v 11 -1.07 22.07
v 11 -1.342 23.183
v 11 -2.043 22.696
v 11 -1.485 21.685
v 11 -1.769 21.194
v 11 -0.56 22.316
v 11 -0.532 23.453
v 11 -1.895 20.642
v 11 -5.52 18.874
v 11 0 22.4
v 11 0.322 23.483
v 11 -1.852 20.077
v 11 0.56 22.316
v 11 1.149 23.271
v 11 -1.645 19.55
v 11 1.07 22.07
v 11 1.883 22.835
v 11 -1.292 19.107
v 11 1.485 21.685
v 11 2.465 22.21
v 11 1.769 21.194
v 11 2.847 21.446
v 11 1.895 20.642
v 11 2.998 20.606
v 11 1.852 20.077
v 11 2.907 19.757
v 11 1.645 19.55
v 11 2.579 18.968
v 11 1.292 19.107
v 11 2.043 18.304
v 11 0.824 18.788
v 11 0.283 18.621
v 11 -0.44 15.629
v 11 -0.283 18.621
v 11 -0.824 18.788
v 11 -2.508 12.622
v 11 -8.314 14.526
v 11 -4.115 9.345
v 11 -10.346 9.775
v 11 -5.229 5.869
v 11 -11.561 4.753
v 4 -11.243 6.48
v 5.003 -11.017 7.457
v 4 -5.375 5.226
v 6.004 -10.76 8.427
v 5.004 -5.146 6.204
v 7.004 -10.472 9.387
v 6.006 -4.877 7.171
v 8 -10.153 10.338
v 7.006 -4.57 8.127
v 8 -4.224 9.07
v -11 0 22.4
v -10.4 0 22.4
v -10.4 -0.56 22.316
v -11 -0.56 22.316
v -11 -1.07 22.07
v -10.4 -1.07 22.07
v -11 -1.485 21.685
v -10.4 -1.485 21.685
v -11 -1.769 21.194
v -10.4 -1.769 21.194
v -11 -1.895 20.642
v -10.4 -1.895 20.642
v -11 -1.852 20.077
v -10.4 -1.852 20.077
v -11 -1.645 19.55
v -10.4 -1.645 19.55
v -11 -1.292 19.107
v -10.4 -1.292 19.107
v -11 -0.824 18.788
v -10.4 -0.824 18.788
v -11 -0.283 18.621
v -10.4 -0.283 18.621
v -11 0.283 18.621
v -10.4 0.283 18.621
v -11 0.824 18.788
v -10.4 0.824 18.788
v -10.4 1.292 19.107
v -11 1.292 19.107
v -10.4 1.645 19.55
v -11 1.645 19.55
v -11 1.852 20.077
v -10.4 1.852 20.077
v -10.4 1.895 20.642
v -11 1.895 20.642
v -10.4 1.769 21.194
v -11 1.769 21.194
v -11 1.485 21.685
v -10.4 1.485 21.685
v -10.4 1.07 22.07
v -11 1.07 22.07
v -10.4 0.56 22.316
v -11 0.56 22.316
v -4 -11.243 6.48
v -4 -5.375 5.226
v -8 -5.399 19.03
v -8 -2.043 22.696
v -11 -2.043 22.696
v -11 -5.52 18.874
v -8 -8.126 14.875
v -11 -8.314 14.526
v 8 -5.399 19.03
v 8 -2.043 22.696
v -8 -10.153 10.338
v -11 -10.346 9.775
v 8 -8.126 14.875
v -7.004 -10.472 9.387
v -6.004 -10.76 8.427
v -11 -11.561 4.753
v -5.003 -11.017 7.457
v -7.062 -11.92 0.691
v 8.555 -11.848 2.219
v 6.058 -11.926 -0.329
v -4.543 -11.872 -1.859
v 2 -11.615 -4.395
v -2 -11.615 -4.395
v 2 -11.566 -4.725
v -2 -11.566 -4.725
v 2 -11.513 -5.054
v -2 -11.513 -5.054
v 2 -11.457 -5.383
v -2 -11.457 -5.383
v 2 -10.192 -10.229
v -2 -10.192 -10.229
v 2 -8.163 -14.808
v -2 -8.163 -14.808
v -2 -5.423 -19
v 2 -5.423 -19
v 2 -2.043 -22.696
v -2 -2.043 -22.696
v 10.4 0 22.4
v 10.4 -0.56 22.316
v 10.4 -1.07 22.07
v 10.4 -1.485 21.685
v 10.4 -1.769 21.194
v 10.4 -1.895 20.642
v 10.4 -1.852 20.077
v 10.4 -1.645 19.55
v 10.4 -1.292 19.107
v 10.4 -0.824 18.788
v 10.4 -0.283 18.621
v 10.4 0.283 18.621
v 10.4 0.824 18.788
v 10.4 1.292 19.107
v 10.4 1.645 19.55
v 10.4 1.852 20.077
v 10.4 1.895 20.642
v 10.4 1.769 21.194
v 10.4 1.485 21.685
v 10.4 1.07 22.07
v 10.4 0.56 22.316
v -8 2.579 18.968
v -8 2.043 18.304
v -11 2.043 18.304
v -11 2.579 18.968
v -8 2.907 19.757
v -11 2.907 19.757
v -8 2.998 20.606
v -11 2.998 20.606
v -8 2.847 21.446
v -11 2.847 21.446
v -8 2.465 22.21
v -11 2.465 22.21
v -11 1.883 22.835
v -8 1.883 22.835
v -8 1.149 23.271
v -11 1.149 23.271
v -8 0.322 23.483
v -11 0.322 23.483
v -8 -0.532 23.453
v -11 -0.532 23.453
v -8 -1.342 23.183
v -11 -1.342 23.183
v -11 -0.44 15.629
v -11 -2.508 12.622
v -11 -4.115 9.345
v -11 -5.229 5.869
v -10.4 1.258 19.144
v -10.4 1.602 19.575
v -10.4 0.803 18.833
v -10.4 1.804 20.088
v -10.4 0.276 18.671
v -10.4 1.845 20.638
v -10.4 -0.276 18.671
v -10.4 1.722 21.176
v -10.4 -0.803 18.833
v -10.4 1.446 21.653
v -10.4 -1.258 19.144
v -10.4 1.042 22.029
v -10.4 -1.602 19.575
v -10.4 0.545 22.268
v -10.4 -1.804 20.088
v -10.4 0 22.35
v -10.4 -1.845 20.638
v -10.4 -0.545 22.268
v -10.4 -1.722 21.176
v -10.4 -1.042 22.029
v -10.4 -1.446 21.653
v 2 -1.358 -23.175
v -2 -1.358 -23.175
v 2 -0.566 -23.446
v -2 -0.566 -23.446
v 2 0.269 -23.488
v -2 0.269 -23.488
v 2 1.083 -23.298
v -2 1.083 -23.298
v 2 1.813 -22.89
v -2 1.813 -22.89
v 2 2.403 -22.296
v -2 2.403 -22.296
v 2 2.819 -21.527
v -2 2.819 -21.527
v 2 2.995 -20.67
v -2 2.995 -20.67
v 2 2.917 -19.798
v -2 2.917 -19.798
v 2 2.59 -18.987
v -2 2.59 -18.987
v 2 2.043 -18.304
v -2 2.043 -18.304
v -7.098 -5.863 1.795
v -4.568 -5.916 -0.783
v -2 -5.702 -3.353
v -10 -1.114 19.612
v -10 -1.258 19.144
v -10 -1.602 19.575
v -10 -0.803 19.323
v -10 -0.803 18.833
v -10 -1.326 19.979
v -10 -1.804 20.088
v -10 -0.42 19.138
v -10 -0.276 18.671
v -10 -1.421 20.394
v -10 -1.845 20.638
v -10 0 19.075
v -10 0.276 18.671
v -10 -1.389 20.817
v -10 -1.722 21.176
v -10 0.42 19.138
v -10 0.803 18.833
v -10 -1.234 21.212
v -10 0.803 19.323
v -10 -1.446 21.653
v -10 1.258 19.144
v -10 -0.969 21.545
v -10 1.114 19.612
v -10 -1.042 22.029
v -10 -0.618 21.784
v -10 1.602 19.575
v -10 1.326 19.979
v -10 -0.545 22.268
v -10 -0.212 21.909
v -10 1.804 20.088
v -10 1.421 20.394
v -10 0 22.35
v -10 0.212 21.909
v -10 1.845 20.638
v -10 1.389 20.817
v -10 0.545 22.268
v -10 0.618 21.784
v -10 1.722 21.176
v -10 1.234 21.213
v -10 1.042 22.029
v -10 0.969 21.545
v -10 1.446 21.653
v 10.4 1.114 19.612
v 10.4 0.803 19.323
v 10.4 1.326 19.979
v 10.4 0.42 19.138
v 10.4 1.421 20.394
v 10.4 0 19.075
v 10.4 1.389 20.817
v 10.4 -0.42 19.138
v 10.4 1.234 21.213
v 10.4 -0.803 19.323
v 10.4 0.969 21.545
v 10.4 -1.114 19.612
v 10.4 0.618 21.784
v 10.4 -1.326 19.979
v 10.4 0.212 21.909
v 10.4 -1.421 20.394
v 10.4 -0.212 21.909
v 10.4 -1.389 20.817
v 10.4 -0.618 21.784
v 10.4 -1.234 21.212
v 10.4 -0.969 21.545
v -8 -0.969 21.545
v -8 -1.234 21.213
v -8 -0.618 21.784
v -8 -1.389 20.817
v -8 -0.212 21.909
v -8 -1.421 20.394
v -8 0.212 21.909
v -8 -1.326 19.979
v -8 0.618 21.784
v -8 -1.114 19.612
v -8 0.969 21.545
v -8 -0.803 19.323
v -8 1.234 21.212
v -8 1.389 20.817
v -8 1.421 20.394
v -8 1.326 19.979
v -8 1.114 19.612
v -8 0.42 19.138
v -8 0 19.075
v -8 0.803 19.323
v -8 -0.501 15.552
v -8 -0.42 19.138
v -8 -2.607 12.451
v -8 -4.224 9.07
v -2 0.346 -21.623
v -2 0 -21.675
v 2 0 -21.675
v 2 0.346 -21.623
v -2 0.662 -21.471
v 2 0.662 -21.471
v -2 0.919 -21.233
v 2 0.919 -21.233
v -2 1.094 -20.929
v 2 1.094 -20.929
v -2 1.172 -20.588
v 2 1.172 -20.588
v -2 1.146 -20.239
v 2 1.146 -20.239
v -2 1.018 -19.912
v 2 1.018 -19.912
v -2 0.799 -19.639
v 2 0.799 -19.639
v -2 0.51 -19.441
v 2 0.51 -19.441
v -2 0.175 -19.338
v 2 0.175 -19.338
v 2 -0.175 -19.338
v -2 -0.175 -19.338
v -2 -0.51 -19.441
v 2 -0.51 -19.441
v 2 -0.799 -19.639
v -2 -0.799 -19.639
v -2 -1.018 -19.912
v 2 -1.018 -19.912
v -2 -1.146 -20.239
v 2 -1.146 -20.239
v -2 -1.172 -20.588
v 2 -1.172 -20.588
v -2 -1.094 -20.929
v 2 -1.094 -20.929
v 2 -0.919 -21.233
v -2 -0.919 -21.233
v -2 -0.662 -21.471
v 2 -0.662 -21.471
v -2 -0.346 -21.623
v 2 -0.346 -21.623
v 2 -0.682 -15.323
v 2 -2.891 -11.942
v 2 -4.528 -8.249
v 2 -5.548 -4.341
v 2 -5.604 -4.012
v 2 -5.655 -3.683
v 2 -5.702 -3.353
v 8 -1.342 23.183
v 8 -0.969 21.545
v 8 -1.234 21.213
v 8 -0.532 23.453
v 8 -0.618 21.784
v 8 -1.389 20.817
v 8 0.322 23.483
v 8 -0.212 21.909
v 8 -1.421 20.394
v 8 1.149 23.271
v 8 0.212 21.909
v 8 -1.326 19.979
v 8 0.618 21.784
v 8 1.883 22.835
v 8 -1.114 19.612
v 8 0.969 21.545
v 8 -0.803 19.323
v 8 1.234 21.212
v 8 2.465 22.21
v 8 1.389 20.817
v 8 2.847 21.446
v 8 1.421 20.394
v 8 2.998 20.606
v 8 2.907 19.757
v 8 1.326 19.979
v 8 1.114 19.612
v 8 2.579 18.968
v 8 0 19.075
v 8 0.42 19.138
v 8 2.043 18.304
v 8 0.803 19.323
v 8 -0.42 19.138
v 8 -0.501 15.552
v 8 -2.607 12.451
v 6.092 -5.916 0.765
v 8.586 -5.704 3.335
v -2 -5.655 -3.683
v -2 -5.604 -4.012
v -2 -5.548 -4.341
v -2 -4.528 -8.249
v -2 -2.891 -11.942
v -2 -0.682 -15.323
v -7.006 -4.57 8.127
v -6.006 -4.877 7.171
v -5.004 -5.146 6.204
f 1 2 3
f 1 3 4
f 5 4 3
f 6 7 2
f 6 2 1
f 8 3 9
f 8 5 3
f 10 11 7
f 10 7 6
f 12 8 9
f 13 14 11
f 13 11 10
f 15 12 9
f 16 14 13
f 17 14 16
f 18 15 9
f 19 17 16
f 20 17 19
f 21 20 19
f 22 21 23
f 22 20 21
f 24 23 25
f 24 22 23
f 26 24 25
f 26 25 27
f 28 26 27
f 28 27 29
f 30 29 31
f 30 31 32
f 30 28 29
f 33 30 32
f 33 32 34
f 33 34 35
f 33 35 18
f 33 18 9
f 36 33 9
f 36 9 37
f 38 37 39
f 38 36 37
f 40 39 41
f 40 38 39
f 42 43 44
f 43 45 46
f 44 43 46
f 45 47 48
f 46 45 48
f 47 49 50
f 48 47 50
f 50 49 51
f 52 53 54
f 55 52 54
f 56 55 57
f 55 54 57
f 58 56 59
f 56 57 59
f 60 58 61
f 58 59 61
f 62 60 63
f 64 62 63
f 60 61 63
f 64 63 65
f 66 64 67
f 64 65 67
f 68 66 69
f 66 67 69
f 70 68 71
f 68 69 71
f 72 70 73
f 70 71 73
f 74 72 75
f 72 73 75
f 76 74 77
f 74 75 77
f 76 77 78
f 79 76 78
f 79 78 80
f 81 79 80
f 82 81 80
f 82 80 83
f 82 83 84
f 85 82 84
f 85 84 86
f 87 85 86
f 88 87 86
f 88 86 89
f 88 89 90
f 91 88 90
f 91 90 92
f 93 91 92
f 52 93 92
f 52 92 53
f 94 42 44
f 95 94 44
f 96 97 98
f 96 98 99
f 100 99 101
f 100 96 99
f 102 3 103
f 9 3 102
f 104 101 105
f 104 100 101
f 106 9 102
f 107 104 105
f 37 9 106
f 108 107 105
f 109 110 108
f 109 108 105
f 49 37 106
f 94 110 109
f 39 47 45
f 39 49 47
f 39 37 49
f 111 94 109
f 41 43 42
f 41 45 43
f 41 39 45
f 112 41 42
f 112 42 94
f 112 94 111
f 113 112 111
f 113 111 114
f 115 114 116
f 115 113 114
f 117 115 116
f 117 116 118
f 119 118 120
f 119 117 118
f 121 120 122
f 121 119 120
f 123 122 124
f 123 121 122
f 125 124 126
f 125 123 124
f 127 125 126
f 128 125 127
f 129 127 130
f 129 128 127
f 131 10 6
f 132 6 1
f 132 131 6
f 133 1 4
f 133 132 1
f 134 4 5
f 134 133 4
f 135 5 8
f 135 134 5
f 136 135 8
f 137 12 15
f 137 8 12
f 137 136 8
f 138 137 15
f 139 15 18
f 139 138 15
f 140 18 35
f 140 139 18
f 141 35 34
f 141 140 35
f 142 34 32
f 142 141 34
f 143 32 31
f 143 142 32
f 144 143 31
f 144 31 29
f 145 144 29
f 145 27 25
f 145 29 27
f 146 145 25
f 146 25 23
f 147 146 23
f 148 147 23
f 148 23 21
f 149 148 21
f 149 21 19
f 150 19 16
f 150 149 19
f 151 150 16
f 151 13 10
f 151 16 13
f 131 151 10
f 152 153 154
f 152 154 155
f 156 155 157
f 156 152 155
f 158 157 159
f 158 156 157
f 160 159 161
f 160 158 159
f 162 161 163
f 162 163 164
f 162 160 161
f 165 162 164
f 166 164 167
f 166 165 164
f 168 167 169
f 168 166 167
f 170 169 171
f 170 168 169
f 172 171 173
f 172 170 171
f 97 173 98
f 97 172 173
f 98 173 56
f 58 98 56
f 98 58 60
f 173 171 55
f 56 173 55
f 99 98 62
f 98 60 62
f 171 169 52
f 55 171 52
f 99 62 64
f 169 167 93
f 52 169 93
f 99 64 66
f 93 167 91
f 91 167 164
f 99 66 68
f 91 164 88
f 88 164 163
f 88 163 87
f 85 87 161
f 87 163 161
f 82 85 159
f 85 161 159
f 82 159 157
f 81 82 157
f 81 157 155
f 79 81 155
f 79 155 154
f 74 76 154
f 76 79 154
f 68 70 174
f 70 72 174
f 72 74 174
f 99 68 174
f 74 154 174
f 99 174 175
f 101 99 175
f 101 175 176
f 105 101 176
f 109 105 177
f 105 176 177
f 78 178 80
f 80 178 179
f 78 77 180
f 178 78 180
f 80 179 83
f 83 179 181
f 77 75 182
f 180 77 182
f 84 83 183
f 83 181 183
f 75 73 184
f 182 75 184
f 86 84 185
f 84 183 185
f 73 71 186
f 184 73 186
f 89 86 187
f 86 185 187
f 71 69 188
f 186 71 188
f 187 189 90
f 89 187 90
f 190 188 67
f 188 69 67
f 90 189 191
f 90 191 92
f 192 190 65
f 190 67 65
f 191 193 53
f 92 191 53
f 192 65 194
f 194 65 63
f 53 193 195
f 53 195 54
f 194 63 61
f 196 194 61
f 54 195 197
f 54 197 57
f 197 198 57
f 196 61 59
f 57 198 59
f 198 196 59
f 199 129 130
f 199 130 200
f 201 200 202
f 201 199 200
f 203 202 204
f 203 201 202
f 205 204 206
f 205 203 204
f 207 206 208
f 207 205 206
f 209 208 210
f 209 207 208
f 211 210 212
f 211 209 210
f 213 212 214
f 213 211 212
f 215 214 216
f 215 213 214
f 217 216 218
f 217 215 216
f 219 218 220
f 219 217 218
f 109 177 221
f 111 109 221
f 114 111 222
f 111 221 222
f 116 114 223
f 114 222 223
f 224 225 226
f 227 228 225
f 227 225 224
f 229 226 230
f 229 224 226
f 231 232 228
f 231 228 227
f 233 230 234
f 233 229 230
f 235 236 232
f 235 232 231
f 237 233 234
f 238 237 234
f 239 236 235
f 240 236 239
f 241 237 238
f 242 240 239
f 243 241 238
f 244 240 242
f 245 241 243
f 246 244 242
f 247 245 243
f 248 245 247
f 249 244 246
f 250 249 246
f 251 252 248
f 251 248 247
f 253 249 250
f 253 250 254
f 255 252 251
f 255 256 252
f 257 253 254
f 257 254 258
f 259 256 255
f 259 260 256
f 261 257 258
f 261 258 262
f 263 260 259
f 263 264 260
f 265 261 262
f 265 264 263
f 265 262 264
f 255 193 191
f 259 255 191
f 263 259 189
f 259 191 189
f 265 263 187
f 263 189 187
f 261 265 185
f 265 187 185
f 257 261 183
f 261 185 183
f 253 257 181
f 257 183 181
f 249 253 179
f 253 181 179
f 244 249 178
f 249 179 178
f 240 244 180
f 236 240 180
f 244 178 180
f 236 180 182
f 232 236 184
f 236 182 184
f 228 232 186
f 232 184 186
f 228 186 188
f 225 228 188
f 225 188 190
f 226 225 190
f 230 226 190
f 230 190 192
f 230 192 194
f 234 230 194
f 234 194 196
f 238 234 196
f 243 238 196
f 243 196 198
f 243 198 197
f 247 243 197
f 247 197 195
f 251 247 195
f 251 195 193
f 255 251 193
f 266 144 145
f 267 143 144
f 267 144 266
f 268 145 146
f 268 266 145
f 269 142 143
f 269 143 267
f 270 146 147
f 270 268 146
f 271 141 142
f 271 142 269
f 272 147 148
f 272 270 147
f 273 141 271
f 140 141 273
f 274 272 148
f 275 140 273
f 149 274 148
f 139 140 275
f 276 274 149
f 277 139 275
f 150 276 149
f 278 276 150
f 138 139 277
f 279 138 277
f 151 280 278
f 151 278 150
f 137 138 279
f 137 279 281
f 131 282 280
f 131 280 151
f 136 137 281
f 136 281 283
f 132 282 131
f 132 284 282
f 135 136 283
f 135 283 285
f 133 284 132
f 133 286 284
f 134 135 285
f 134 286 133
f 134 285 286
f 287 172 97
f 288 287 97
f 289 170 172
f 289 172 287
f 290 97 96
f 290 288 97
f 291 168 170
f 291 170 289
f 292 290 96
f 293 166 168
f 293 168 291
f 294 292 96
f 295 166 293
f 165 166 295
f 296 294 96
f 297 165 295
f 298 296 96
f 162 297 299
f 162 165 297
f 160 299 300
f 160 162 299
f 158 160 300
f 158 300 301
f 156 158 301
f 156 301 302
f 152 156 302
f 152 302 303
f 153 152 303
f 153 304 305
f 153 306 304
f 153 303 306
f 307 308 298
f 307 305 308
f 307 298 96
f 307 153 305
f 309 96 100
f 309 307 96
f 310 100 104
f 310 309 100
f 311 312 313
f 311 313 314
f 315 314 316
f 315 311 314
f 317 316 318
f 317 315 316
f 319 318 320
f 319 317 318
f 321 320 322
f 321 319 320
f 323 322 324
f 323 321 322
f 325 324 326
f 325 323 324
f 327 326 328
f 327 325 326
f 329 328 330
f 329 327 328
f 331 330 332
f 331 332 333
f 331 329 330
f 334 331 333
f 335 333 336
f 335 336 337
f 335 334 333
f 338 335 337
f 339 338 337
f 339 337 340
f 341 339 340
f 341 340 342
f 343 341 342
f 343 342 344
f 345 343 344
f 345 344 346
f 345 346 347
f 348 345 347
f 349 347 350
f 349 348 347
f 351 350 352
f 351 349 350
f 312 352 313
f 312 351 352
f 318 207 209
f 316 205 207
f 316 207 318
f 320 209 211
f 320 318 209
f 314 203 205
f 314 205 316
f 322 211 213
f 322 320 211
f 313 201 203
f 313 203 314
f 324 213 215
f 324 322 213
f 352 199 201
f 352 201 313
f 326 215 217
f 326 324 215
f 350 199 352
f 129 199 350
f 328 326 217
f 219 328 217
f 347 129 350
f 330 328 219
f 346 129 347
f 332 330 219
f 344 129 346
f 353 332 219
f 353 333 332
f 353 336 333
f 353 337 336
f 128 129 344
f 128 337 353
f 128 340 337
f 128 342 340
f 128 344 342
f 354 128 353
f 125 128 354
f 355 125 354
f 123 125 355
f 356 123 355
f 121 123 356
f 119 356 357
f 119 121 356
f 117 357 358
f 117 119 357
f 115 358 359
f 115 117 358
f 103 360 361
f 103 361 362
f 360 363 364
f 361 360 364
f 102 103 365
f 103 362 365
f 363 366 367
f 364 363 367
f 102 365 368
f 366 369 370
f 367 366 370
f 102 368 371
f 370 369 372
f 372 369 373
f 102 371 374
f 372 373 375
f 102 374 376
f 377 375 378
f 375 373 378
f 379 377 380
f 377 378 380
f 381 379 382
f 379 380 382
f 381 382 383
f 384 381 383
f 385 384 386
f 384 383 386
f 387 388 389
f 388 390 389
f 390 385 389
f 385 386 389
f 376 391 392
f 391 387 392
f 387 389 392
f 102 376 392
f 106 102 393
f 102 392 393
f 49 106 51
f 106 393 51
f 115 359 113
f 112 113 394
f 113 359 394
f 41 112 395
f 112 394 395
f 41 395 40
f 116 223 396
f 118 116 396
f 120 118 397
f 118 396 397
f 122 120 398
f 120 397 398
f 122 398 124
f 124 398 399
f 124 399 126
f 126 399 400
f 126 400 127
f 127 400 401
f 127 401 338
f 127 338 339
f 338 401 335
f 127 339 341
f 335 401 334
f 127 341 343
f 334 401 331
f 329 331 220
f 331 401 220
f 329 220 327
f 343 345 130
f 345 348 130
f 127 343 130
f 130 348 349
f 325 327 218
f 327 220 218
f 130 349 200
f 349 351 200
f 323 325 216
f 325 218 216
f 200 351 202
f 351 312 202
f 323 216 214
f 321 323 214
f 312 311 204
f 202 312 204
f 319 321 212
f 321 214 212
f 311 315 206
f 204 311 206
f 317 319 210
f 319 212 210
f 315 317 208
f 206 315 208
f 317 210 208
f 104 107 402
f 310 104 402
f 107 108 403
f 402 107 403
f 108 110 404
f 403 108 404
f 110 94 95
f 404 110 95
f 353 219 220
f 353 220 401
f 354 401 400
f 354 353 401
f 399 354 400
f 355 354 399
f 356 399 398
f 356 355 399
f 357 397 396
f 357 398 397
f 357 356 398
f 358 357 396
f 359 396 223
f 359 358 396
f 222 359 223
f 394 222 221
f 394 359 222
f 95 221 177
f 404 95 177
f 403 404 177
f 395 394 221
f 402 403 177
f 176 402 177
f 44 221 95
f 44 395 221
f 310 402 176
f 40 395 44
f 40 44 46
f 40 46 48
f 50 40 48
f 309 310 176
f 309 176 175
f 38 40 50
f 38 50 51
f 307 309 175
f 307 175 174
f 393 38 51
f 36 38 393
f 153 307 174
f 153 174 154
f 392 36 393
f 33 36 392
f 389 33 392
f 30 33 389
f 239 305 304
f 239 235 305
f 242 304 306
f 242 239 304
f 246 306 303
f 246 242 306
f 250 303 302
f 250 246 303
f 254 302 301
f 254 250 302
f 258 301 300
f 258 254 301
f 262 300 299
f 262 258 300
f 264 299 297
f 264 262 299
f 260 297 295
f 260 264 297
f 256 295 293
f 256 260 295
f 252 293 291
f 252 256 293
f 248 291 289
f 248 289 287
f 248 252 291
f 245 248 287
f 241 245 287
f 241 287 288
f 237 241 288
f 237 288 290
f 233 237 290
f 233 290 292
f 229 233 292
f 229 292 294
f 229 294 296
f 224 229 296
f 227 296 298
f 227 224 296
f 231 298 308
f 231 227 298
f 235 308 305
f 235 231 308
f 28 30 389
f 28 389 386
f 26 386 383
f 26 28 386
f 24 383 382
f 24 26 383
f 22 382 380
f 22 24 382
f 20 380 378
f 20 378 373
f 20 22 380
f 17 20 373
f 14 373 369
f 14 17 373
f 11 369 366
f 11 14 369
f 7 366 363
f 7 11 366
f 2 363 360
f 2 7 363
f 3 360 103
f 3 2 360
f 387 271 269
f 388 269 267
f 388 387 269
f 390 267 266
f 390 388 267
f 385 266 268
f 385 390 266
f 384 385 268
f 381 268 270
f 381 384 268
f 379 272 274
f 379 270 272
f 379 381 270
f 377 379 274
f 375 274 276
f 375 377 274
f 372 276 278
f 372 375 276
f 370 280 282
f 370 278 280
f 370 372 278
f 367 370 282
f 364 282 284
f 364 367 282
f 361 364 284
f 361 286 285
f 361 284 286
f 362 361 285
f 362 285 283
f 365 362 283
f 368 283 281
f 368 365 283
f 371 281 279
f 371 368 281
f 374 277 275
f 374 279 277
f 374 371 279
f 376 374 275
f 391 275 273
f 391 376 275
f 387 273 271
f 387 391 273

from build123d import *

# Parameters (mm, degrees)
SKETCH_1_R               = 1.175
SKETCH_1_R_2             = 1.425
EXTRUDE_1_DEPTH          = 11
CUT_EXTRUDE_1_DEPTH      = 8
CUT_EXTRUDE_1_DEPTH_BACK = 8
SKETCH_1_6_R             = 1.425
SKETCH_4_R               = 1.175
CUT_EXTRUDE_3_DEPTH      = 9
CUT_EXTRUDE_START        = -0.6
SKETCH_6_R               = 1.9
CUT_EXTRUDE_5_DEPTH      = 35.929603411
SKETCH_3_R               = 1.85
CUT_EXTRUDE_2_DEPTH      = 1
CHAMFER_2_SIZE           = 10
CHAMFER_3_SIZE           = 4


with BuildPart() as part:
    # 草图1 → 凸台-拉伸1 (new, symmetric)
    with BuildSketch(Plane(origin=(0, 0, 0), x_dir=(0, 0, -1), z_dir=(1, 0, 0))):
        with BuildLine():
            ThreePointArc((-22.696428571, -2.043453335), (0, -11.927768877), (22.696428571, -2.043453335))
            ThreePointArc((22.696428571, -2.043453335), (22.543453335, 2.196428571), (18.303571429, 2.043453335))
            ThreePointArc((18.303571429, 2.043453335), (0, -5.927768877), (-18.303571429, 2.043453335))
            ThreePointArc((-18.303571429, 2.043453335), (-22.543453335, 2.196428571), (-22.696428571, -2.043453335))
        make_face()
        with Locations((20.5, 0)):
            Circle(SKETCH_1_R, mode=Mode.SUBTRACT)
        with Locations((-20.5, 0)):
            Circle(SKETCH_1_R_2, mode=Mode.SUBTRACT)
    extrude(amount=EXTRUDE_1_DEPTH, both=True)

    # 草图1<6> → 切除-拉伸1 (cut, two sides: drawn at the far end of the back side and taken through both)
    with BuildSketch(Plane(origin=(0, 0, 0), x_dir=(0, 0, -1), z_dir=(1, 0, 0)).offset(-CUT_EXTRUDE_1_DEPTH_BACK)):
        with BuildLine():
            ThreePointArc((-22.696428571, -2.043453335), (-15.296359873, -7.89110277), (-6.48036682, -11.242861585))
            Line((-6.48036682, -11.242861585), (-5.226102274, -5.375424287))
            ThreePointArc((-5.226102274, -5.375424287), (-12.335774091, -2.672392985), (-18.303571429, 2.043453335))
            ThreePointArc((-18.303571429, 2.043453335), (-22.543453335, 2.196428571), (-22.696428571, -2.043453335))
        make_face()
        with Locations((-20.5, 0)):
            Circle(SKETCH_1_6_R, mode=Mode.SUBTRACT)
    extrude(amount=CUT_EXTRUDE_1_DEPTH + CUT_EXTRUDE_1_DEPTH_BACK, mode=Mode.SUBTRACT)

    # 草图4 → 切除-拉伸3 (cut)
    with BuildSketch(Plane(origin=(11, 0, 0), x_dir=(0, 0, -1), z_dir=(1, 0, 0))):
        with BuildLine():
            ThreePointArc((18.303571429, 2.043453335), (11.941686142, -2.891287085), (4.341204442, -5.547962703))
            Line((4.341204442, -5.547962703), (5.383093508, -11.456809221))
            ThreePointArc((5.383093508, -11.456809221), (14.807690816, -8.162531455), (22.696428571, -2.043453335))
            ThreePointArc((22.696428571, -2.043453335), (23.487928503, 0.268855462), (22.296358841, 2.402726558))
            ThreePointArc((22.296358841, 2.402726558), (20.231144538, 2.987928503), (18.303571429, 2.043453335))
        make_face()
        with Locations((20.5, 0)):
            Circle(SKETCH_4_R, mode=Mode.SUBTRACT)
    cut_extrude_3 = extrude(amount=-CUT_EXTRUDE_3_DEPTH, mode=Mode.SUBTRACT)

    # 草图6 → 切除-拉伸5 (cut)
    with BuildSketch(Plane(origin=(11, 0, 0), x_dir=(0, 0, -1), z_dir=(1, 0, 0)).offset(CUT_EXTRUDE_START)):
        with Locations(Location((-20.5, 0, 0), (0, 0, 180))):
            Circle(SKETCH_6_R)
    cut_extrude_5 = extrude(amount=CUT_EXTRUDE_5_DEPTH, mode=Mode.SUBTRACT)

    # 镜向3: 切除-拉伸3, 切除-拉伸5 across plane
    add(cut_extrude_3.mirror(Plane(origin=(0, 0, 0), x_dir=(0, 0, 1), z_dir=(1, 0, 0))), mode=Mode.SUBTRACT)
    add(cut_extrude_5.mirror(Plane(origin=(0, 0, 0), x_dir=(0, 0, 1), z_dir=(1, 0, 0))), mode=Mode.SUBTRACT)

    # 草图3 → 切除-拉伸2 (cut)
    with BuildSketch(Plane.ZY.offset(11)):
        with Locations((20.5, 0)):
            Circle(SKETCH_3_R)
    extrude(amount=-CUT_EXTRUDE_2_DEPTH, mode=Mode.SUBTRACT)

    # 倒角2
    # the kernel refuses this chamfer: 10 mm, written as the material it adds along each edge
    # the kernel refuses this chamfer: 10 mm, written as the material it takes off along each edge
    with BuildSketch(Plane(origin=(-11, 19.778170746, 0.124476202), x_dir=(-0.027495876610586313, -0.1735825242275637, 0.9844354138551714), z_dir=(0, -0.9848077530122094, -0.17364817766692373))) as chamfer_2_2_piece_1_section:
        Polygon((CHAMFER_2_SIZE * 0.999621916911, -CHAMFER_2_SIZE * 0.0274958766106), (-CHAMFER_2_SIZE * 0.0274958766106, -CHAMFER_2_SIZE * 0.999621916911), (0, 0), align=None)
    chamfer_2_2_piece_1 = extrude(amount=57.433659759, mode=Mode.PRIVATE)
    chamfer_2_2_piece_1 = split(chamfer_2_2_piece_1, bisect_by=Plane(origin=(-2, -8.783186583, -1.465639678), z_dir=(-1, 0, 0)), keep=Keep.TOP, mode=Mode.PRIVATE)
    add(chamfer_2_2_piece_1, mode=Mode.SUBTRACT)
    with BuildSketch(Plane(origin=(11, 19.778170746, 0.124476202), x_dir=(-0.9996219169112968, 0.004774608866782908, -0.027078152461972493), z_dir=(0, -0.9848077530122094, -0.17364817766692373))) as chamfer_2_2_piece_2_section:
        Polygon((CHAMFER_2_SIZE * 0.999621916911, -CHAMFER_2_SIZE * 0.0274958766106), (-CHAMFER_2_SIZE * 0.0274958766106, -CHAMFER_2_SIZE * 0.999621916911), (0, 0), align=None)
    chamfer_2_2_piece_2 = extrude(amount=57.433659759, mode=Mode.PRIVATE)
    chamfer_2_2_piece_2 = split(chamfer_2_2_piece_2, bisect_by=Plane(origin=(2, -8.783186583, -1.465639678), z_dir=(1, 0, 0)), keep=Keep.TOP, mode=Mode.PRIVATE)
    add(chamfer_2_2_piece_2, mode=Mode.SUBTRACT)

    # 倒角3
    chamfer_3_edges = [part.edges().sort_by_distance(p)[0] for p in [
        (8, -8.309142936, 5.853234547),
        (-8, -8.309142936, 5.853234547),
    ]]
    chamfer(chamfer_3_edges, length=CHAMFER_3_SIZE)


solid = part.part
